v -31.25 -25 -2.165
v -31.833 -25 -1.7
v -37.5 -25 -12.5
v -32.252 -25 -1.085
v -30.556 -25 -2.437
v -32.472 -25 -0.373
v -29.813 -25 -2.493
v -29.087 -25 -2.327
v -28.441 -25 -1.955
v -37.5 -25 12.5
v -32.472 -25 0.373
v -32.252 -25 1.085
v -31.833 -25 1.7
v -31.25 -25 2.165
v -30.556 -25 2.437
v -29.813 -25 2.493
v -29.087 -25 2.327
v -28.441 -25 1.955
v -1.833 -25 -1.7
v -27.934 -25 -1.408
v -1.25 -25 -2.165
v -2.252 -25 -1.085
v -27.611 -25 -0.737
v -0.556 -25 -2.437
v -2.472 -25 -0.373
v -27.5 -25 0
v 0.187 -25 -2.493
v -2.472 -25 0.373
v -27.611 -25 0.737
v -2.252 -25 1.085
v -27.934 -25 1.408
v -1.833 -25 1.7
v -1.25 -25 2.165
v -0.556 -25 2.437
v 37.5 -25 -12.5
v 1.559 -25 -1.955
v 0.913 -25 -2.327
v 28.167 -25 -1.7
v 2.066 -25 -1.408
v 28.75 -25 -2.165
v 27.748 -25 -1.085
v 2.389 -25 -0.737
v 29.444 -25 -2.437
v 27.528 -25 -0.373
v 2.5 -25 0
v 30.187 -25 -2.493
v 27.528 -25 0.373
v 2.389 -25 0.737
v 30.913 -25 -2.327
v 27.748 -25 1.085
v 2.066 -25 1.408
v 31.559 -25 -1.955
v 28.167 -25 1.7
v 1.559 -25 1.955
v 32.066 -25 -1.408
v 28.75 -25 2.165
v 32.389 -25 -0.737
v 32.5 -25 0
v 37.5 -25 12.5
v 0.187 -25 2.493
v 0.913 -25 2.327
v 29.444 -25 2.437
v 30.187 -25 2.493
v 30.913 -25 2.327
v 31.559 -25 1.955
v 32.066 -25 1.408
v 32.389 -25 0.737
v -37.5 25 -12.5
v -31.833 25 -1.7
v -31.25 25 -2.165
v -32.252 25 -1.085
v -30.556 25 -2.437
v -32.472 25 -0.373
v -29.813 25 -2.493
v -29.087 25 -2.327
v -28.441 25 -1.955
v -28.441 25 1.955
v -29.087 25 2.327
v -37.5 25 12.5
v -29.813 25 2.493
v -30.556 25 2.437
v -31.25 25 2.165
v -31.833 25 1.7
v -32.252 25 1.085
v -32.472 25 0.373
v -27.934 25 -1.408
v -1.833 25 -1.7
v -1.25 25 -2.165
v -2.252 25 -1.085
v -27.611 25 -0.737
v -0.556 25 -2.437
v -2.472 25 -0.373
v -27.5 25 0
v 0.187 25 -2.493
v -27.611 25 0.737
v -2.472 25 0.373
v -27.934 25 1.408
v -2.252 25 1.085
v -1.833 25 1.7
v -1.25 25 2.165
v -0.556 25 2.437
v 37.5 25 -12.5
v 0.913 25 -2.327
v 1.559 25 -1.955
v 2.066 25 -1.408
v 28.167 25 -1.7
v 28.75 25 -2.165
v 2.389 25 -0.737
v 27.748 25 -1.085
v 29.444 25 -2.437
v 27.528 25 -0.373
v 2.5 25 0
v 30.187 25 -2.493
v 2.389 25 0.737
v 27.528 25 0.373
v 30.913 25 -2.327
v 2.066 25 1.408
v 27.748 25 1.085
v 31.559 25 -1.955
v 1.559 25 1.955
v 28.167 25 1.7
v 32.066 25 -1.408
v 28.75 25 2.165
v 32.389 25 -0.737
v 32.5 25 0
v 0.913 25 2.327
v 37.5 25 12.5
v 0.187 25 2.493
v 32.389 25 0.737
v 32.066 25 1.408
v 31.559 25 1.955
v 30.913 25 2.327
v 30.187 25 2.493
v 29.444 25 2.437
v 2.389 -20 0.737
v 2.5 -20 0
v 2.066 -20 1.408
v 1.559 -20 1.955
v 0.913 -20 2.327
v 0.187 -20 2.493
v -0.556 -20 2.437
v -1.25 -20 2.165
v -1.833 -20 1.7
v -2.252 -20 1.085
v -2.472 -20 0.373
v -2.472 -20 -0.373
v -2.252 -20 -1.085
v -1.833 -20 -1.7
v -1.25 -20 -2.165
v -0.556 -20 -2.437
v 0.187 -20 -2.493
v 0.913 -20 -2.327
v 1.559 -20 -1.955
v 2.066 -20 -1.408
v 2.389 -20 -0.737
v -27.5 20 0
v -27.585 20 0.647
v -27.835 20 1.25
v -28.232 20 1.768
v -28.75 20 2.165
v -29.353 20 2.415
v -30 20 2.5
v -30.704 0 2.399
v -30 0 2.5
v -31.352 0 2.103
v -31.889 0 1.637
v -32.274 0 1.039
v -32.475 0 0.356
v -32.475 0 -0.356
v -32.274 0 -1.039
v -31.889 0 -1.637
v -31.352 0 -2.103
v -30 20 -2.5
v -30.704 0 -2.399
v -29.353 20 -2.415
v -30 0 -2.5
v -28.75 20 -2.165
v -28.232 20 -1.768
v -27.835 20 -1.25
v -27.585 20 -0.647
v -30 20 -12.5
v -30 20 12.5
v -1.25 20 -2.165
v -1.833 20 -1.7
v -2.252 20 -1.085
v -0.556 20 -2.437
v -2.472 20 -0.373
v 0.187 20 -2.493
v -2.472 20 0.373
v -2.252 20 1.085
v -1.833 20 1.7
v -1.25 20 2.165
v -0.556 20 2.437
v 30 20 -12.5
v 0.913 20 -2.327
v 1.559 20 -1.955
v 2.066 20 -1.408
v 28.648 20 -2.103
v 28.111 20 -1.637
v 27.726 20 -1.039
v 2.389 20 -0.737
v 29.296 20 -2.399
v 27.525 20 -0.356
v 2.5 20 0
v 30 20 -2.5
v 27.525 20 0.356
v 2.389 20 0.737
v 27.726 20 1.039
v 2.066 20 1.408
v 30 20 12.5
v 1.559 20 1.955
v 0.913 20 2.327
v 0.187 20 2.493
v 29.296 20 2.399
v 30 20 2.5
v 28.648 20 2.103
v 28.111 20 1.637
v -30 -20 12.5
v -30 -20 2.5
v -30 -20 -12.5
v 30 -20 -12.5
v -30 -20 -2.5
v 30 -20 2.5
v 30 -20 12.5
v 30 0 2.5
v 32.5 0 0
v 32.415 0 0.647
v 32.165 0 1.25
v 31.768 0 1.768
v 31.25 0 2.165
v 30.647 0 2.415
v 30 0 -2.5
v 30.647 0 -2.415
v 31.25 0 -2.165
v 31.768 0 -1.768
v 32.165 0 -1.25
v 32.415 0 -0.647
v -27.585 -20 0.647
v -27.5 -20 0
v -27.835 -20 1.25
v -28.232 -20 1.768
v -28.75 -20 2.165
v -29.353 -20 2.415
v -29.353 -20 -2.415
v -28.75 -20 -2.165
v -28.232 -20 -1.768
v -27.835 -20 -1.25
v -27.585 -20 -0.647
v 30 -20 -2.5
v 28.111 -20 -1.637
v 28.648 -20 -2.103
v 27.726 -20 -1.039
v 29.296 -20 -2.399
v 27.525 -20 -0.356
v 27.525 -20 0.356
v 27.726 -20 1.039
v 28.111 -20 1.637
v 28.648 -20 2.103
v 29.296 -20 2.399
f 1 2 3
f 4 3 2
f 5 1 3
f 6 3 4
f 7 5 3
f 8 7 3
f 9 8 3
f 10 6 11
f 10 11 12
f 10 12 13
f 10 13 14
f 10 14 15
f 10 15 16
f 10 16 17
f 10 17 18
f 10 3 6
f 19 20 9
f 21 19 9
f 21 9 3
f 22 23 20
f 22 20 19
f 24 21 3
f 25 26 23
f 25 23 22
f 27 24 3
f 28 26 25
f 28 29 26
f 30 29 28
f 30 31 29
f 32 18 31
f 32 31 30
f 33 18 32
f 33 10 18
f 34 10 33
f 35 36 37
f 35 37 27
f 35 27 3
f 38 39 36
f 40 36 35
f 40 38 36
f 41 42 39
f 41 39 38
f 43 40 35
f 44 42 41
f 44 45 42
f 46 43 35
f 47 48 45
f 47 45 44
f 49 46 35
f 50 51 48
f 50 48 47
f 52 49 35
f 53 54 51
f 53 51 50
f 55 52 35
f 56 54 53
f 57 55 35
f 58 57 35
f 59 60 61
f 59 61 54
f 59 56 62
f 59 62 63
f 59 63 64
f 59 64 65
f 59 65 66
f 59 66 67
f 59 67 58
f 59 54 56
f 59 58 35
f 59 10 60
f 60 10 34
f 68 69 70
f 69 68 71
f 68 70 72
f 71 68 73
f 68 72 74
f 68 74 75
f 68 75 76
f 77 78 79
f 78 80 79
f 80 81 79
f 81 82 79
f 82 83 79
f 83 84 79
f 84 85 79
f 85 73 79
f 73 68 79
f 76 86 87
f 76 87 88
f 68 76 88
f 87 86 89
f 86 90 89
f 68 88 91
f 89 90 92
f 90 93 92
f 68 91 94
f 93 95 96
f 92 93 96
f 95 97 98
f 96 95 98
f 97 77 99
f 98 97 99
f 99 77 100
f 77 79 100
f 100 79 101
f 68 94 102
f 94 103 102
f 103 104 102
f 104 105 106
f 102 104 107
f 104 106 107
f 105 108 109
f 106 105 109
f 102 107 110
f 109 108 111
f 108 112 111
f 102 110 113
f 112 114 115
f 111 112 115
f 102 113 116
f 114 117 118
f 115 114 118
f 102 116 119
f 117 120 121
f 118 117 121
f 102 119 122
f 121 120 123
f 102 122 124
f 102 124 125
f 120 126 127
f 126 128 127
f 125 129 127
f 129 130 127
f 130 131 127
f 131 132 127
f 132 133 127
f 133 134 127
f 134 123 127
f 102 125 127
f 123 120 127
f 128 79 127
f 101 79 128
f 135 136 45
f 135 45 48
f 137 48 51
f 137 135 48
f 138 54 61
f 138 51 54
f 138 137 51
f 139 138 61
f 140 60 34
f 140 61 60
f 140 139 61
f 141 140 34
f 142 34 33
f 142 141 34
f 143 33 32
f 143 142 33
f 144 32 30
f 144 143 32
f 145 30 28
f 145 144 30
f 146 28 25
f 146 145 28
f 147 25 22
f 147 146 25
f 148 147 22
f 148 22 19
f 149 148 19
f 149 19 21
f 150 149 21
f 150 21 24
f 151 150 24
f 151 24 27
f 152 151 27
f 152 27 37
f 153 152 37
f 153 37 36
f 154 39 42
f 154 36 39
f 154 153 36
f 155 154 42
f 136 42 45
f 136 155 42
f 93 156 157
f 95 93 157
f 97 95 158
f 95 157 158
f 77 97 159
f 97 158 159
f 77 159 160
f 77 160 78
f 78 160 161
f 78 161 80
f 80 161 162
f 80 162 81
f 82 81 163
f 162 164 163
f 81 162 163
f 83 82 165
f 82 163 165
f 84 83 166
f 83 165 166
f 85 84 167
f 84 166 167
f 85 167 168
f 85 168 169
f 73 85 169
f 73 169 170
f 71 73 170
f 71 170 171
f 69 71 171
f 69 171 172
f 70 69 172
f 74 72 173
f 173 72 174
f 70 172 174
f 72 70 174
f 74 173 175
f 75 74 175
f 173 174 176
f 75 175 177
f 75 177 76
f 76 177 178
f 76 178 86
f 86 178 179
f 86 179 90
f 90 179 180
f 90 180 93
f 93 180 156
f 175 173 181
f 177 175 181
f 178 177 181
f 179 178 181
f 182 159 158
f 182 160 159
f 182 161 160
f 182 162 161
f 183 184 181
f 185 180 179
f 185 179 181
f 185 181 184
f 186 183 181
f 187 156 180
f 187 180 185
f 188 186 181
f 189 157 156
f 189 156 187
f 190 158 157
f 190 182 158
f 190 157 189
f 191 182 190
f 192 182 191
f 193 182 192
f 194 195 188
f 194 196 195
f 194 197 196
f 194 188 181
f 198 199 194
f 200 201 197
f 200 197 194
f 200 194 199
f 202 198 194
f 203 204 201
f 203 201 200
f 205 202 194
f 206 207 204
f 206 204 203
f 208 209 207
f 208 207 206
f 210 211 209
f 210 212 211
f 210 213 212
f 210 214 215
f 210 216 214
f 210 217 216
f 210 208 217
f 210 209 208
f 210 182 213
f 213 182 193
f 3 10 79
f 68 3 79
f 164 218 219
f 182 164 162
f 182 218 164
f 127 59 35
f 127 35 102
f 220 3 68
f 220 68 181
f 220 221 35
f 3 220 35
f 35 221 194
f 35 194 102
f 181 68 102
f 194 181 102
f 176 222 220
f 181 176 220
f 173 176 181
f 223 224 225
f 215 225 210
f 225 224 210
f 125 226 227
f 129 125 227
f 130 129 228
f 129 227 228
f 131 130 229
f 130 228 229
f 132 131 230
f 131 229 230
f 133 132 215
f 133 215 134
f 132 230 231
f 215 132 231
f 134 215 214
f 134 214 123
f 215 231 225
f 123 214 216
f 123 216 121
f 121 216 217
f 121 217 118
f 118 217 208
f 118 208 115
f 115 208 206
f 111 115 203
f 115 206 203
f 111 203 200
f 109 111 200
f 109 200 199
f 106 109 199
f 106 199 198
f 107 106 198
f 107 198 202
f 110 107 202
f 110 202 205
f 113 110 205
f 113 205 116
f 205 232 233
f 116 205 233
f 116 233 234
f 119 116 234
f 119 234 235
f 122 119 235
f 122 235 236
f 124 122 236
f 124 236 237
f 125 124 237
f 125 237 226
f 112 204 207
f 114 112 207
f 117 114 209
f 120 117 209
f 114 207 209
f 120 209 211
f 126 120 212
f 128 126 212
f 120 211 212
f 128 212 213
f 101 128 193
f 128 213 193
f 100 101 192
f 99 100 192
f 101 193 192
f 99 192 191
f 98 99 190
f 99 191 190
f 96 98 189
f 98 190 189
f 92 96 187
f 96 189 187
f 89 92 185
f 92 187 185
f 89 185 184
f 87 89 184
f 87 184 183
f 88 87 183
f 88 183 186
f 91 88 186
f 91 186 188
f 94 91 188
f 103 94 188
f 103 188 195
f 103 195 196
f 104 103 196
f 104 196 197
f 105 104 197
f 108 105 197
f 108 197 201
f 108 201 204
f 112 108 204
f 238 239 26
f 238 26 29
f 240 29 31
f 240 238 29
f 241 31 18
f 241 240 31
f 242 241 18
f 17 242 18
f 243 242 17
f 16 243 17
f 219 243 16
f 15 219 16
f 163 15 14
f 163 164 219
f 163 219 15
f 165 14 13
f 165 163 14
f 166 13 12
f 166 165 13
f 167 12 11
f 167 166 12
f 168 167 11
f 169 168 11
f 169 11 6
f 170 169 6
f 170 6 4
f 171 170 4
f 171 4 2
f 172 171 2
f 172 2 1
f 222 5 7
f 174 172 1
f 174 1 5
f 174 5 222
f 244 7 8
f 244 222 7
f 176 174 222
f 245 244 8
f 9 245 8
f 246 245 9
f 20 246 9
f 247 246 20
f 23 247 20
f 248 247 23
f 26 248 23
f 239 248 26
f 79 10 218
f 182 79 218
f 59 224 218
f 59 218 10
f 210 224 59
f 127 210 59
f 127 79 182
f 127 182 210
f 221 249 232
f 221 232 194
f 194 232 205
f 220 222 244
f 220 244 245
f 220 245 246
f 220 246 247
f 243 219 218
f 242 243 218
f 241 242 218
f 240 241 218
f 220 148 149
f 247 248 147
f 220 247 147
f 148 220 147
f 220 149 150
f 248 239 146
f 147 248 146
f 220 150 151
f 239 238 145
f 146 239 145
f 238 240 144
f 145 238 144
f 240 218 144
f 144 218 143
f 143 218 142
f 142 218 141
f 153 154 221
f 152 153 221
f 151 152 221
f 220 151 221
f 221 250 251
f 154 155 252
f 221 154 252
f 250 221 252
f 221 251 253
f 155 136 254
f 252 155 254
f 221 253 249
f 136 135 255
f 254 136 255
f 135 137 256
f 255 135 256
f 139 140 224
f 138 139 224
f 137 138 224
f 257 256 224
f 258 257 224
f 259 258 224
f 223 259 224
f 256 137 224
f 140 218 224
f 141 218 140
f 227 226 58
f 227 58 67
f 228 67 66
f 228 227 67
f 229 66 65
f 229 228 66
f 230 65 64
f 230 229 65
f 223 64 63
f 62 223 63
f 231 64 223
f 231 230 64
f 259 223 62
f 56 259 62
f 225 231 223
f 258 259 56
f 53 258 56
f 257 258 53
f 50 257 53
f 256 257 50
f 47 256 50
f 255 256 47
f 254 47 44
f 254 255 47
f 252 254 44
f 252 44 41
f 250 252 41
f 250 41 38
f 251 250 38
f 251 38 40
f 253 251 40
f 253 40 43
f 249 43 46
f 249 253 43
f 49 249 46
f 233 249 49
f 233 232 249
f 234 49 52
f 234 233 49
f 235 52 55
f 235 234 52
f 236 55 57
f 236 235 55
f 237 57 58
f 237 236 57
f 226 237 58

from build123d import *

# Parameters (mm, degrees)
F0_W          = 75
F0_H          = 50
F0_W_2        = 60
F0_H_2        = 40
F1_DEPTH      = 12.5
F2_R          = 2.5
F3_DEPTH      = 25.001
F3_DEPTH_BACK = 25.001


with BuildPart() as f1:
    # F0 (on Top) → F1 (new body, symmetric)
    with BuildSketch(Plane.XY):
        Rectangle(F0_W, F0_H)
        Rectangle(F0_W_2, F0_H_2, mode=Mode.SUBTRACT)
    extrude(amount=F1_DEPTH, both=True)

    # F2 (on Front) → F3 (cut, two sides)
    with BuildSketch(Plane.XZ) as f3_sk:
        with Locations((-30, 0)):
            Circle(F2_R)
        with Locations((30, 0)):
            Circle(F2_R)
        Circle(F2_R)
    extrude(amount=-F3_DEPTH, mode=Mode.SUBTRACT)
    extrude(f3_sk.sketch, amount=F3_DEPTH_BACK, mode=Mode.SUBTRACT)


solid = f1.part
